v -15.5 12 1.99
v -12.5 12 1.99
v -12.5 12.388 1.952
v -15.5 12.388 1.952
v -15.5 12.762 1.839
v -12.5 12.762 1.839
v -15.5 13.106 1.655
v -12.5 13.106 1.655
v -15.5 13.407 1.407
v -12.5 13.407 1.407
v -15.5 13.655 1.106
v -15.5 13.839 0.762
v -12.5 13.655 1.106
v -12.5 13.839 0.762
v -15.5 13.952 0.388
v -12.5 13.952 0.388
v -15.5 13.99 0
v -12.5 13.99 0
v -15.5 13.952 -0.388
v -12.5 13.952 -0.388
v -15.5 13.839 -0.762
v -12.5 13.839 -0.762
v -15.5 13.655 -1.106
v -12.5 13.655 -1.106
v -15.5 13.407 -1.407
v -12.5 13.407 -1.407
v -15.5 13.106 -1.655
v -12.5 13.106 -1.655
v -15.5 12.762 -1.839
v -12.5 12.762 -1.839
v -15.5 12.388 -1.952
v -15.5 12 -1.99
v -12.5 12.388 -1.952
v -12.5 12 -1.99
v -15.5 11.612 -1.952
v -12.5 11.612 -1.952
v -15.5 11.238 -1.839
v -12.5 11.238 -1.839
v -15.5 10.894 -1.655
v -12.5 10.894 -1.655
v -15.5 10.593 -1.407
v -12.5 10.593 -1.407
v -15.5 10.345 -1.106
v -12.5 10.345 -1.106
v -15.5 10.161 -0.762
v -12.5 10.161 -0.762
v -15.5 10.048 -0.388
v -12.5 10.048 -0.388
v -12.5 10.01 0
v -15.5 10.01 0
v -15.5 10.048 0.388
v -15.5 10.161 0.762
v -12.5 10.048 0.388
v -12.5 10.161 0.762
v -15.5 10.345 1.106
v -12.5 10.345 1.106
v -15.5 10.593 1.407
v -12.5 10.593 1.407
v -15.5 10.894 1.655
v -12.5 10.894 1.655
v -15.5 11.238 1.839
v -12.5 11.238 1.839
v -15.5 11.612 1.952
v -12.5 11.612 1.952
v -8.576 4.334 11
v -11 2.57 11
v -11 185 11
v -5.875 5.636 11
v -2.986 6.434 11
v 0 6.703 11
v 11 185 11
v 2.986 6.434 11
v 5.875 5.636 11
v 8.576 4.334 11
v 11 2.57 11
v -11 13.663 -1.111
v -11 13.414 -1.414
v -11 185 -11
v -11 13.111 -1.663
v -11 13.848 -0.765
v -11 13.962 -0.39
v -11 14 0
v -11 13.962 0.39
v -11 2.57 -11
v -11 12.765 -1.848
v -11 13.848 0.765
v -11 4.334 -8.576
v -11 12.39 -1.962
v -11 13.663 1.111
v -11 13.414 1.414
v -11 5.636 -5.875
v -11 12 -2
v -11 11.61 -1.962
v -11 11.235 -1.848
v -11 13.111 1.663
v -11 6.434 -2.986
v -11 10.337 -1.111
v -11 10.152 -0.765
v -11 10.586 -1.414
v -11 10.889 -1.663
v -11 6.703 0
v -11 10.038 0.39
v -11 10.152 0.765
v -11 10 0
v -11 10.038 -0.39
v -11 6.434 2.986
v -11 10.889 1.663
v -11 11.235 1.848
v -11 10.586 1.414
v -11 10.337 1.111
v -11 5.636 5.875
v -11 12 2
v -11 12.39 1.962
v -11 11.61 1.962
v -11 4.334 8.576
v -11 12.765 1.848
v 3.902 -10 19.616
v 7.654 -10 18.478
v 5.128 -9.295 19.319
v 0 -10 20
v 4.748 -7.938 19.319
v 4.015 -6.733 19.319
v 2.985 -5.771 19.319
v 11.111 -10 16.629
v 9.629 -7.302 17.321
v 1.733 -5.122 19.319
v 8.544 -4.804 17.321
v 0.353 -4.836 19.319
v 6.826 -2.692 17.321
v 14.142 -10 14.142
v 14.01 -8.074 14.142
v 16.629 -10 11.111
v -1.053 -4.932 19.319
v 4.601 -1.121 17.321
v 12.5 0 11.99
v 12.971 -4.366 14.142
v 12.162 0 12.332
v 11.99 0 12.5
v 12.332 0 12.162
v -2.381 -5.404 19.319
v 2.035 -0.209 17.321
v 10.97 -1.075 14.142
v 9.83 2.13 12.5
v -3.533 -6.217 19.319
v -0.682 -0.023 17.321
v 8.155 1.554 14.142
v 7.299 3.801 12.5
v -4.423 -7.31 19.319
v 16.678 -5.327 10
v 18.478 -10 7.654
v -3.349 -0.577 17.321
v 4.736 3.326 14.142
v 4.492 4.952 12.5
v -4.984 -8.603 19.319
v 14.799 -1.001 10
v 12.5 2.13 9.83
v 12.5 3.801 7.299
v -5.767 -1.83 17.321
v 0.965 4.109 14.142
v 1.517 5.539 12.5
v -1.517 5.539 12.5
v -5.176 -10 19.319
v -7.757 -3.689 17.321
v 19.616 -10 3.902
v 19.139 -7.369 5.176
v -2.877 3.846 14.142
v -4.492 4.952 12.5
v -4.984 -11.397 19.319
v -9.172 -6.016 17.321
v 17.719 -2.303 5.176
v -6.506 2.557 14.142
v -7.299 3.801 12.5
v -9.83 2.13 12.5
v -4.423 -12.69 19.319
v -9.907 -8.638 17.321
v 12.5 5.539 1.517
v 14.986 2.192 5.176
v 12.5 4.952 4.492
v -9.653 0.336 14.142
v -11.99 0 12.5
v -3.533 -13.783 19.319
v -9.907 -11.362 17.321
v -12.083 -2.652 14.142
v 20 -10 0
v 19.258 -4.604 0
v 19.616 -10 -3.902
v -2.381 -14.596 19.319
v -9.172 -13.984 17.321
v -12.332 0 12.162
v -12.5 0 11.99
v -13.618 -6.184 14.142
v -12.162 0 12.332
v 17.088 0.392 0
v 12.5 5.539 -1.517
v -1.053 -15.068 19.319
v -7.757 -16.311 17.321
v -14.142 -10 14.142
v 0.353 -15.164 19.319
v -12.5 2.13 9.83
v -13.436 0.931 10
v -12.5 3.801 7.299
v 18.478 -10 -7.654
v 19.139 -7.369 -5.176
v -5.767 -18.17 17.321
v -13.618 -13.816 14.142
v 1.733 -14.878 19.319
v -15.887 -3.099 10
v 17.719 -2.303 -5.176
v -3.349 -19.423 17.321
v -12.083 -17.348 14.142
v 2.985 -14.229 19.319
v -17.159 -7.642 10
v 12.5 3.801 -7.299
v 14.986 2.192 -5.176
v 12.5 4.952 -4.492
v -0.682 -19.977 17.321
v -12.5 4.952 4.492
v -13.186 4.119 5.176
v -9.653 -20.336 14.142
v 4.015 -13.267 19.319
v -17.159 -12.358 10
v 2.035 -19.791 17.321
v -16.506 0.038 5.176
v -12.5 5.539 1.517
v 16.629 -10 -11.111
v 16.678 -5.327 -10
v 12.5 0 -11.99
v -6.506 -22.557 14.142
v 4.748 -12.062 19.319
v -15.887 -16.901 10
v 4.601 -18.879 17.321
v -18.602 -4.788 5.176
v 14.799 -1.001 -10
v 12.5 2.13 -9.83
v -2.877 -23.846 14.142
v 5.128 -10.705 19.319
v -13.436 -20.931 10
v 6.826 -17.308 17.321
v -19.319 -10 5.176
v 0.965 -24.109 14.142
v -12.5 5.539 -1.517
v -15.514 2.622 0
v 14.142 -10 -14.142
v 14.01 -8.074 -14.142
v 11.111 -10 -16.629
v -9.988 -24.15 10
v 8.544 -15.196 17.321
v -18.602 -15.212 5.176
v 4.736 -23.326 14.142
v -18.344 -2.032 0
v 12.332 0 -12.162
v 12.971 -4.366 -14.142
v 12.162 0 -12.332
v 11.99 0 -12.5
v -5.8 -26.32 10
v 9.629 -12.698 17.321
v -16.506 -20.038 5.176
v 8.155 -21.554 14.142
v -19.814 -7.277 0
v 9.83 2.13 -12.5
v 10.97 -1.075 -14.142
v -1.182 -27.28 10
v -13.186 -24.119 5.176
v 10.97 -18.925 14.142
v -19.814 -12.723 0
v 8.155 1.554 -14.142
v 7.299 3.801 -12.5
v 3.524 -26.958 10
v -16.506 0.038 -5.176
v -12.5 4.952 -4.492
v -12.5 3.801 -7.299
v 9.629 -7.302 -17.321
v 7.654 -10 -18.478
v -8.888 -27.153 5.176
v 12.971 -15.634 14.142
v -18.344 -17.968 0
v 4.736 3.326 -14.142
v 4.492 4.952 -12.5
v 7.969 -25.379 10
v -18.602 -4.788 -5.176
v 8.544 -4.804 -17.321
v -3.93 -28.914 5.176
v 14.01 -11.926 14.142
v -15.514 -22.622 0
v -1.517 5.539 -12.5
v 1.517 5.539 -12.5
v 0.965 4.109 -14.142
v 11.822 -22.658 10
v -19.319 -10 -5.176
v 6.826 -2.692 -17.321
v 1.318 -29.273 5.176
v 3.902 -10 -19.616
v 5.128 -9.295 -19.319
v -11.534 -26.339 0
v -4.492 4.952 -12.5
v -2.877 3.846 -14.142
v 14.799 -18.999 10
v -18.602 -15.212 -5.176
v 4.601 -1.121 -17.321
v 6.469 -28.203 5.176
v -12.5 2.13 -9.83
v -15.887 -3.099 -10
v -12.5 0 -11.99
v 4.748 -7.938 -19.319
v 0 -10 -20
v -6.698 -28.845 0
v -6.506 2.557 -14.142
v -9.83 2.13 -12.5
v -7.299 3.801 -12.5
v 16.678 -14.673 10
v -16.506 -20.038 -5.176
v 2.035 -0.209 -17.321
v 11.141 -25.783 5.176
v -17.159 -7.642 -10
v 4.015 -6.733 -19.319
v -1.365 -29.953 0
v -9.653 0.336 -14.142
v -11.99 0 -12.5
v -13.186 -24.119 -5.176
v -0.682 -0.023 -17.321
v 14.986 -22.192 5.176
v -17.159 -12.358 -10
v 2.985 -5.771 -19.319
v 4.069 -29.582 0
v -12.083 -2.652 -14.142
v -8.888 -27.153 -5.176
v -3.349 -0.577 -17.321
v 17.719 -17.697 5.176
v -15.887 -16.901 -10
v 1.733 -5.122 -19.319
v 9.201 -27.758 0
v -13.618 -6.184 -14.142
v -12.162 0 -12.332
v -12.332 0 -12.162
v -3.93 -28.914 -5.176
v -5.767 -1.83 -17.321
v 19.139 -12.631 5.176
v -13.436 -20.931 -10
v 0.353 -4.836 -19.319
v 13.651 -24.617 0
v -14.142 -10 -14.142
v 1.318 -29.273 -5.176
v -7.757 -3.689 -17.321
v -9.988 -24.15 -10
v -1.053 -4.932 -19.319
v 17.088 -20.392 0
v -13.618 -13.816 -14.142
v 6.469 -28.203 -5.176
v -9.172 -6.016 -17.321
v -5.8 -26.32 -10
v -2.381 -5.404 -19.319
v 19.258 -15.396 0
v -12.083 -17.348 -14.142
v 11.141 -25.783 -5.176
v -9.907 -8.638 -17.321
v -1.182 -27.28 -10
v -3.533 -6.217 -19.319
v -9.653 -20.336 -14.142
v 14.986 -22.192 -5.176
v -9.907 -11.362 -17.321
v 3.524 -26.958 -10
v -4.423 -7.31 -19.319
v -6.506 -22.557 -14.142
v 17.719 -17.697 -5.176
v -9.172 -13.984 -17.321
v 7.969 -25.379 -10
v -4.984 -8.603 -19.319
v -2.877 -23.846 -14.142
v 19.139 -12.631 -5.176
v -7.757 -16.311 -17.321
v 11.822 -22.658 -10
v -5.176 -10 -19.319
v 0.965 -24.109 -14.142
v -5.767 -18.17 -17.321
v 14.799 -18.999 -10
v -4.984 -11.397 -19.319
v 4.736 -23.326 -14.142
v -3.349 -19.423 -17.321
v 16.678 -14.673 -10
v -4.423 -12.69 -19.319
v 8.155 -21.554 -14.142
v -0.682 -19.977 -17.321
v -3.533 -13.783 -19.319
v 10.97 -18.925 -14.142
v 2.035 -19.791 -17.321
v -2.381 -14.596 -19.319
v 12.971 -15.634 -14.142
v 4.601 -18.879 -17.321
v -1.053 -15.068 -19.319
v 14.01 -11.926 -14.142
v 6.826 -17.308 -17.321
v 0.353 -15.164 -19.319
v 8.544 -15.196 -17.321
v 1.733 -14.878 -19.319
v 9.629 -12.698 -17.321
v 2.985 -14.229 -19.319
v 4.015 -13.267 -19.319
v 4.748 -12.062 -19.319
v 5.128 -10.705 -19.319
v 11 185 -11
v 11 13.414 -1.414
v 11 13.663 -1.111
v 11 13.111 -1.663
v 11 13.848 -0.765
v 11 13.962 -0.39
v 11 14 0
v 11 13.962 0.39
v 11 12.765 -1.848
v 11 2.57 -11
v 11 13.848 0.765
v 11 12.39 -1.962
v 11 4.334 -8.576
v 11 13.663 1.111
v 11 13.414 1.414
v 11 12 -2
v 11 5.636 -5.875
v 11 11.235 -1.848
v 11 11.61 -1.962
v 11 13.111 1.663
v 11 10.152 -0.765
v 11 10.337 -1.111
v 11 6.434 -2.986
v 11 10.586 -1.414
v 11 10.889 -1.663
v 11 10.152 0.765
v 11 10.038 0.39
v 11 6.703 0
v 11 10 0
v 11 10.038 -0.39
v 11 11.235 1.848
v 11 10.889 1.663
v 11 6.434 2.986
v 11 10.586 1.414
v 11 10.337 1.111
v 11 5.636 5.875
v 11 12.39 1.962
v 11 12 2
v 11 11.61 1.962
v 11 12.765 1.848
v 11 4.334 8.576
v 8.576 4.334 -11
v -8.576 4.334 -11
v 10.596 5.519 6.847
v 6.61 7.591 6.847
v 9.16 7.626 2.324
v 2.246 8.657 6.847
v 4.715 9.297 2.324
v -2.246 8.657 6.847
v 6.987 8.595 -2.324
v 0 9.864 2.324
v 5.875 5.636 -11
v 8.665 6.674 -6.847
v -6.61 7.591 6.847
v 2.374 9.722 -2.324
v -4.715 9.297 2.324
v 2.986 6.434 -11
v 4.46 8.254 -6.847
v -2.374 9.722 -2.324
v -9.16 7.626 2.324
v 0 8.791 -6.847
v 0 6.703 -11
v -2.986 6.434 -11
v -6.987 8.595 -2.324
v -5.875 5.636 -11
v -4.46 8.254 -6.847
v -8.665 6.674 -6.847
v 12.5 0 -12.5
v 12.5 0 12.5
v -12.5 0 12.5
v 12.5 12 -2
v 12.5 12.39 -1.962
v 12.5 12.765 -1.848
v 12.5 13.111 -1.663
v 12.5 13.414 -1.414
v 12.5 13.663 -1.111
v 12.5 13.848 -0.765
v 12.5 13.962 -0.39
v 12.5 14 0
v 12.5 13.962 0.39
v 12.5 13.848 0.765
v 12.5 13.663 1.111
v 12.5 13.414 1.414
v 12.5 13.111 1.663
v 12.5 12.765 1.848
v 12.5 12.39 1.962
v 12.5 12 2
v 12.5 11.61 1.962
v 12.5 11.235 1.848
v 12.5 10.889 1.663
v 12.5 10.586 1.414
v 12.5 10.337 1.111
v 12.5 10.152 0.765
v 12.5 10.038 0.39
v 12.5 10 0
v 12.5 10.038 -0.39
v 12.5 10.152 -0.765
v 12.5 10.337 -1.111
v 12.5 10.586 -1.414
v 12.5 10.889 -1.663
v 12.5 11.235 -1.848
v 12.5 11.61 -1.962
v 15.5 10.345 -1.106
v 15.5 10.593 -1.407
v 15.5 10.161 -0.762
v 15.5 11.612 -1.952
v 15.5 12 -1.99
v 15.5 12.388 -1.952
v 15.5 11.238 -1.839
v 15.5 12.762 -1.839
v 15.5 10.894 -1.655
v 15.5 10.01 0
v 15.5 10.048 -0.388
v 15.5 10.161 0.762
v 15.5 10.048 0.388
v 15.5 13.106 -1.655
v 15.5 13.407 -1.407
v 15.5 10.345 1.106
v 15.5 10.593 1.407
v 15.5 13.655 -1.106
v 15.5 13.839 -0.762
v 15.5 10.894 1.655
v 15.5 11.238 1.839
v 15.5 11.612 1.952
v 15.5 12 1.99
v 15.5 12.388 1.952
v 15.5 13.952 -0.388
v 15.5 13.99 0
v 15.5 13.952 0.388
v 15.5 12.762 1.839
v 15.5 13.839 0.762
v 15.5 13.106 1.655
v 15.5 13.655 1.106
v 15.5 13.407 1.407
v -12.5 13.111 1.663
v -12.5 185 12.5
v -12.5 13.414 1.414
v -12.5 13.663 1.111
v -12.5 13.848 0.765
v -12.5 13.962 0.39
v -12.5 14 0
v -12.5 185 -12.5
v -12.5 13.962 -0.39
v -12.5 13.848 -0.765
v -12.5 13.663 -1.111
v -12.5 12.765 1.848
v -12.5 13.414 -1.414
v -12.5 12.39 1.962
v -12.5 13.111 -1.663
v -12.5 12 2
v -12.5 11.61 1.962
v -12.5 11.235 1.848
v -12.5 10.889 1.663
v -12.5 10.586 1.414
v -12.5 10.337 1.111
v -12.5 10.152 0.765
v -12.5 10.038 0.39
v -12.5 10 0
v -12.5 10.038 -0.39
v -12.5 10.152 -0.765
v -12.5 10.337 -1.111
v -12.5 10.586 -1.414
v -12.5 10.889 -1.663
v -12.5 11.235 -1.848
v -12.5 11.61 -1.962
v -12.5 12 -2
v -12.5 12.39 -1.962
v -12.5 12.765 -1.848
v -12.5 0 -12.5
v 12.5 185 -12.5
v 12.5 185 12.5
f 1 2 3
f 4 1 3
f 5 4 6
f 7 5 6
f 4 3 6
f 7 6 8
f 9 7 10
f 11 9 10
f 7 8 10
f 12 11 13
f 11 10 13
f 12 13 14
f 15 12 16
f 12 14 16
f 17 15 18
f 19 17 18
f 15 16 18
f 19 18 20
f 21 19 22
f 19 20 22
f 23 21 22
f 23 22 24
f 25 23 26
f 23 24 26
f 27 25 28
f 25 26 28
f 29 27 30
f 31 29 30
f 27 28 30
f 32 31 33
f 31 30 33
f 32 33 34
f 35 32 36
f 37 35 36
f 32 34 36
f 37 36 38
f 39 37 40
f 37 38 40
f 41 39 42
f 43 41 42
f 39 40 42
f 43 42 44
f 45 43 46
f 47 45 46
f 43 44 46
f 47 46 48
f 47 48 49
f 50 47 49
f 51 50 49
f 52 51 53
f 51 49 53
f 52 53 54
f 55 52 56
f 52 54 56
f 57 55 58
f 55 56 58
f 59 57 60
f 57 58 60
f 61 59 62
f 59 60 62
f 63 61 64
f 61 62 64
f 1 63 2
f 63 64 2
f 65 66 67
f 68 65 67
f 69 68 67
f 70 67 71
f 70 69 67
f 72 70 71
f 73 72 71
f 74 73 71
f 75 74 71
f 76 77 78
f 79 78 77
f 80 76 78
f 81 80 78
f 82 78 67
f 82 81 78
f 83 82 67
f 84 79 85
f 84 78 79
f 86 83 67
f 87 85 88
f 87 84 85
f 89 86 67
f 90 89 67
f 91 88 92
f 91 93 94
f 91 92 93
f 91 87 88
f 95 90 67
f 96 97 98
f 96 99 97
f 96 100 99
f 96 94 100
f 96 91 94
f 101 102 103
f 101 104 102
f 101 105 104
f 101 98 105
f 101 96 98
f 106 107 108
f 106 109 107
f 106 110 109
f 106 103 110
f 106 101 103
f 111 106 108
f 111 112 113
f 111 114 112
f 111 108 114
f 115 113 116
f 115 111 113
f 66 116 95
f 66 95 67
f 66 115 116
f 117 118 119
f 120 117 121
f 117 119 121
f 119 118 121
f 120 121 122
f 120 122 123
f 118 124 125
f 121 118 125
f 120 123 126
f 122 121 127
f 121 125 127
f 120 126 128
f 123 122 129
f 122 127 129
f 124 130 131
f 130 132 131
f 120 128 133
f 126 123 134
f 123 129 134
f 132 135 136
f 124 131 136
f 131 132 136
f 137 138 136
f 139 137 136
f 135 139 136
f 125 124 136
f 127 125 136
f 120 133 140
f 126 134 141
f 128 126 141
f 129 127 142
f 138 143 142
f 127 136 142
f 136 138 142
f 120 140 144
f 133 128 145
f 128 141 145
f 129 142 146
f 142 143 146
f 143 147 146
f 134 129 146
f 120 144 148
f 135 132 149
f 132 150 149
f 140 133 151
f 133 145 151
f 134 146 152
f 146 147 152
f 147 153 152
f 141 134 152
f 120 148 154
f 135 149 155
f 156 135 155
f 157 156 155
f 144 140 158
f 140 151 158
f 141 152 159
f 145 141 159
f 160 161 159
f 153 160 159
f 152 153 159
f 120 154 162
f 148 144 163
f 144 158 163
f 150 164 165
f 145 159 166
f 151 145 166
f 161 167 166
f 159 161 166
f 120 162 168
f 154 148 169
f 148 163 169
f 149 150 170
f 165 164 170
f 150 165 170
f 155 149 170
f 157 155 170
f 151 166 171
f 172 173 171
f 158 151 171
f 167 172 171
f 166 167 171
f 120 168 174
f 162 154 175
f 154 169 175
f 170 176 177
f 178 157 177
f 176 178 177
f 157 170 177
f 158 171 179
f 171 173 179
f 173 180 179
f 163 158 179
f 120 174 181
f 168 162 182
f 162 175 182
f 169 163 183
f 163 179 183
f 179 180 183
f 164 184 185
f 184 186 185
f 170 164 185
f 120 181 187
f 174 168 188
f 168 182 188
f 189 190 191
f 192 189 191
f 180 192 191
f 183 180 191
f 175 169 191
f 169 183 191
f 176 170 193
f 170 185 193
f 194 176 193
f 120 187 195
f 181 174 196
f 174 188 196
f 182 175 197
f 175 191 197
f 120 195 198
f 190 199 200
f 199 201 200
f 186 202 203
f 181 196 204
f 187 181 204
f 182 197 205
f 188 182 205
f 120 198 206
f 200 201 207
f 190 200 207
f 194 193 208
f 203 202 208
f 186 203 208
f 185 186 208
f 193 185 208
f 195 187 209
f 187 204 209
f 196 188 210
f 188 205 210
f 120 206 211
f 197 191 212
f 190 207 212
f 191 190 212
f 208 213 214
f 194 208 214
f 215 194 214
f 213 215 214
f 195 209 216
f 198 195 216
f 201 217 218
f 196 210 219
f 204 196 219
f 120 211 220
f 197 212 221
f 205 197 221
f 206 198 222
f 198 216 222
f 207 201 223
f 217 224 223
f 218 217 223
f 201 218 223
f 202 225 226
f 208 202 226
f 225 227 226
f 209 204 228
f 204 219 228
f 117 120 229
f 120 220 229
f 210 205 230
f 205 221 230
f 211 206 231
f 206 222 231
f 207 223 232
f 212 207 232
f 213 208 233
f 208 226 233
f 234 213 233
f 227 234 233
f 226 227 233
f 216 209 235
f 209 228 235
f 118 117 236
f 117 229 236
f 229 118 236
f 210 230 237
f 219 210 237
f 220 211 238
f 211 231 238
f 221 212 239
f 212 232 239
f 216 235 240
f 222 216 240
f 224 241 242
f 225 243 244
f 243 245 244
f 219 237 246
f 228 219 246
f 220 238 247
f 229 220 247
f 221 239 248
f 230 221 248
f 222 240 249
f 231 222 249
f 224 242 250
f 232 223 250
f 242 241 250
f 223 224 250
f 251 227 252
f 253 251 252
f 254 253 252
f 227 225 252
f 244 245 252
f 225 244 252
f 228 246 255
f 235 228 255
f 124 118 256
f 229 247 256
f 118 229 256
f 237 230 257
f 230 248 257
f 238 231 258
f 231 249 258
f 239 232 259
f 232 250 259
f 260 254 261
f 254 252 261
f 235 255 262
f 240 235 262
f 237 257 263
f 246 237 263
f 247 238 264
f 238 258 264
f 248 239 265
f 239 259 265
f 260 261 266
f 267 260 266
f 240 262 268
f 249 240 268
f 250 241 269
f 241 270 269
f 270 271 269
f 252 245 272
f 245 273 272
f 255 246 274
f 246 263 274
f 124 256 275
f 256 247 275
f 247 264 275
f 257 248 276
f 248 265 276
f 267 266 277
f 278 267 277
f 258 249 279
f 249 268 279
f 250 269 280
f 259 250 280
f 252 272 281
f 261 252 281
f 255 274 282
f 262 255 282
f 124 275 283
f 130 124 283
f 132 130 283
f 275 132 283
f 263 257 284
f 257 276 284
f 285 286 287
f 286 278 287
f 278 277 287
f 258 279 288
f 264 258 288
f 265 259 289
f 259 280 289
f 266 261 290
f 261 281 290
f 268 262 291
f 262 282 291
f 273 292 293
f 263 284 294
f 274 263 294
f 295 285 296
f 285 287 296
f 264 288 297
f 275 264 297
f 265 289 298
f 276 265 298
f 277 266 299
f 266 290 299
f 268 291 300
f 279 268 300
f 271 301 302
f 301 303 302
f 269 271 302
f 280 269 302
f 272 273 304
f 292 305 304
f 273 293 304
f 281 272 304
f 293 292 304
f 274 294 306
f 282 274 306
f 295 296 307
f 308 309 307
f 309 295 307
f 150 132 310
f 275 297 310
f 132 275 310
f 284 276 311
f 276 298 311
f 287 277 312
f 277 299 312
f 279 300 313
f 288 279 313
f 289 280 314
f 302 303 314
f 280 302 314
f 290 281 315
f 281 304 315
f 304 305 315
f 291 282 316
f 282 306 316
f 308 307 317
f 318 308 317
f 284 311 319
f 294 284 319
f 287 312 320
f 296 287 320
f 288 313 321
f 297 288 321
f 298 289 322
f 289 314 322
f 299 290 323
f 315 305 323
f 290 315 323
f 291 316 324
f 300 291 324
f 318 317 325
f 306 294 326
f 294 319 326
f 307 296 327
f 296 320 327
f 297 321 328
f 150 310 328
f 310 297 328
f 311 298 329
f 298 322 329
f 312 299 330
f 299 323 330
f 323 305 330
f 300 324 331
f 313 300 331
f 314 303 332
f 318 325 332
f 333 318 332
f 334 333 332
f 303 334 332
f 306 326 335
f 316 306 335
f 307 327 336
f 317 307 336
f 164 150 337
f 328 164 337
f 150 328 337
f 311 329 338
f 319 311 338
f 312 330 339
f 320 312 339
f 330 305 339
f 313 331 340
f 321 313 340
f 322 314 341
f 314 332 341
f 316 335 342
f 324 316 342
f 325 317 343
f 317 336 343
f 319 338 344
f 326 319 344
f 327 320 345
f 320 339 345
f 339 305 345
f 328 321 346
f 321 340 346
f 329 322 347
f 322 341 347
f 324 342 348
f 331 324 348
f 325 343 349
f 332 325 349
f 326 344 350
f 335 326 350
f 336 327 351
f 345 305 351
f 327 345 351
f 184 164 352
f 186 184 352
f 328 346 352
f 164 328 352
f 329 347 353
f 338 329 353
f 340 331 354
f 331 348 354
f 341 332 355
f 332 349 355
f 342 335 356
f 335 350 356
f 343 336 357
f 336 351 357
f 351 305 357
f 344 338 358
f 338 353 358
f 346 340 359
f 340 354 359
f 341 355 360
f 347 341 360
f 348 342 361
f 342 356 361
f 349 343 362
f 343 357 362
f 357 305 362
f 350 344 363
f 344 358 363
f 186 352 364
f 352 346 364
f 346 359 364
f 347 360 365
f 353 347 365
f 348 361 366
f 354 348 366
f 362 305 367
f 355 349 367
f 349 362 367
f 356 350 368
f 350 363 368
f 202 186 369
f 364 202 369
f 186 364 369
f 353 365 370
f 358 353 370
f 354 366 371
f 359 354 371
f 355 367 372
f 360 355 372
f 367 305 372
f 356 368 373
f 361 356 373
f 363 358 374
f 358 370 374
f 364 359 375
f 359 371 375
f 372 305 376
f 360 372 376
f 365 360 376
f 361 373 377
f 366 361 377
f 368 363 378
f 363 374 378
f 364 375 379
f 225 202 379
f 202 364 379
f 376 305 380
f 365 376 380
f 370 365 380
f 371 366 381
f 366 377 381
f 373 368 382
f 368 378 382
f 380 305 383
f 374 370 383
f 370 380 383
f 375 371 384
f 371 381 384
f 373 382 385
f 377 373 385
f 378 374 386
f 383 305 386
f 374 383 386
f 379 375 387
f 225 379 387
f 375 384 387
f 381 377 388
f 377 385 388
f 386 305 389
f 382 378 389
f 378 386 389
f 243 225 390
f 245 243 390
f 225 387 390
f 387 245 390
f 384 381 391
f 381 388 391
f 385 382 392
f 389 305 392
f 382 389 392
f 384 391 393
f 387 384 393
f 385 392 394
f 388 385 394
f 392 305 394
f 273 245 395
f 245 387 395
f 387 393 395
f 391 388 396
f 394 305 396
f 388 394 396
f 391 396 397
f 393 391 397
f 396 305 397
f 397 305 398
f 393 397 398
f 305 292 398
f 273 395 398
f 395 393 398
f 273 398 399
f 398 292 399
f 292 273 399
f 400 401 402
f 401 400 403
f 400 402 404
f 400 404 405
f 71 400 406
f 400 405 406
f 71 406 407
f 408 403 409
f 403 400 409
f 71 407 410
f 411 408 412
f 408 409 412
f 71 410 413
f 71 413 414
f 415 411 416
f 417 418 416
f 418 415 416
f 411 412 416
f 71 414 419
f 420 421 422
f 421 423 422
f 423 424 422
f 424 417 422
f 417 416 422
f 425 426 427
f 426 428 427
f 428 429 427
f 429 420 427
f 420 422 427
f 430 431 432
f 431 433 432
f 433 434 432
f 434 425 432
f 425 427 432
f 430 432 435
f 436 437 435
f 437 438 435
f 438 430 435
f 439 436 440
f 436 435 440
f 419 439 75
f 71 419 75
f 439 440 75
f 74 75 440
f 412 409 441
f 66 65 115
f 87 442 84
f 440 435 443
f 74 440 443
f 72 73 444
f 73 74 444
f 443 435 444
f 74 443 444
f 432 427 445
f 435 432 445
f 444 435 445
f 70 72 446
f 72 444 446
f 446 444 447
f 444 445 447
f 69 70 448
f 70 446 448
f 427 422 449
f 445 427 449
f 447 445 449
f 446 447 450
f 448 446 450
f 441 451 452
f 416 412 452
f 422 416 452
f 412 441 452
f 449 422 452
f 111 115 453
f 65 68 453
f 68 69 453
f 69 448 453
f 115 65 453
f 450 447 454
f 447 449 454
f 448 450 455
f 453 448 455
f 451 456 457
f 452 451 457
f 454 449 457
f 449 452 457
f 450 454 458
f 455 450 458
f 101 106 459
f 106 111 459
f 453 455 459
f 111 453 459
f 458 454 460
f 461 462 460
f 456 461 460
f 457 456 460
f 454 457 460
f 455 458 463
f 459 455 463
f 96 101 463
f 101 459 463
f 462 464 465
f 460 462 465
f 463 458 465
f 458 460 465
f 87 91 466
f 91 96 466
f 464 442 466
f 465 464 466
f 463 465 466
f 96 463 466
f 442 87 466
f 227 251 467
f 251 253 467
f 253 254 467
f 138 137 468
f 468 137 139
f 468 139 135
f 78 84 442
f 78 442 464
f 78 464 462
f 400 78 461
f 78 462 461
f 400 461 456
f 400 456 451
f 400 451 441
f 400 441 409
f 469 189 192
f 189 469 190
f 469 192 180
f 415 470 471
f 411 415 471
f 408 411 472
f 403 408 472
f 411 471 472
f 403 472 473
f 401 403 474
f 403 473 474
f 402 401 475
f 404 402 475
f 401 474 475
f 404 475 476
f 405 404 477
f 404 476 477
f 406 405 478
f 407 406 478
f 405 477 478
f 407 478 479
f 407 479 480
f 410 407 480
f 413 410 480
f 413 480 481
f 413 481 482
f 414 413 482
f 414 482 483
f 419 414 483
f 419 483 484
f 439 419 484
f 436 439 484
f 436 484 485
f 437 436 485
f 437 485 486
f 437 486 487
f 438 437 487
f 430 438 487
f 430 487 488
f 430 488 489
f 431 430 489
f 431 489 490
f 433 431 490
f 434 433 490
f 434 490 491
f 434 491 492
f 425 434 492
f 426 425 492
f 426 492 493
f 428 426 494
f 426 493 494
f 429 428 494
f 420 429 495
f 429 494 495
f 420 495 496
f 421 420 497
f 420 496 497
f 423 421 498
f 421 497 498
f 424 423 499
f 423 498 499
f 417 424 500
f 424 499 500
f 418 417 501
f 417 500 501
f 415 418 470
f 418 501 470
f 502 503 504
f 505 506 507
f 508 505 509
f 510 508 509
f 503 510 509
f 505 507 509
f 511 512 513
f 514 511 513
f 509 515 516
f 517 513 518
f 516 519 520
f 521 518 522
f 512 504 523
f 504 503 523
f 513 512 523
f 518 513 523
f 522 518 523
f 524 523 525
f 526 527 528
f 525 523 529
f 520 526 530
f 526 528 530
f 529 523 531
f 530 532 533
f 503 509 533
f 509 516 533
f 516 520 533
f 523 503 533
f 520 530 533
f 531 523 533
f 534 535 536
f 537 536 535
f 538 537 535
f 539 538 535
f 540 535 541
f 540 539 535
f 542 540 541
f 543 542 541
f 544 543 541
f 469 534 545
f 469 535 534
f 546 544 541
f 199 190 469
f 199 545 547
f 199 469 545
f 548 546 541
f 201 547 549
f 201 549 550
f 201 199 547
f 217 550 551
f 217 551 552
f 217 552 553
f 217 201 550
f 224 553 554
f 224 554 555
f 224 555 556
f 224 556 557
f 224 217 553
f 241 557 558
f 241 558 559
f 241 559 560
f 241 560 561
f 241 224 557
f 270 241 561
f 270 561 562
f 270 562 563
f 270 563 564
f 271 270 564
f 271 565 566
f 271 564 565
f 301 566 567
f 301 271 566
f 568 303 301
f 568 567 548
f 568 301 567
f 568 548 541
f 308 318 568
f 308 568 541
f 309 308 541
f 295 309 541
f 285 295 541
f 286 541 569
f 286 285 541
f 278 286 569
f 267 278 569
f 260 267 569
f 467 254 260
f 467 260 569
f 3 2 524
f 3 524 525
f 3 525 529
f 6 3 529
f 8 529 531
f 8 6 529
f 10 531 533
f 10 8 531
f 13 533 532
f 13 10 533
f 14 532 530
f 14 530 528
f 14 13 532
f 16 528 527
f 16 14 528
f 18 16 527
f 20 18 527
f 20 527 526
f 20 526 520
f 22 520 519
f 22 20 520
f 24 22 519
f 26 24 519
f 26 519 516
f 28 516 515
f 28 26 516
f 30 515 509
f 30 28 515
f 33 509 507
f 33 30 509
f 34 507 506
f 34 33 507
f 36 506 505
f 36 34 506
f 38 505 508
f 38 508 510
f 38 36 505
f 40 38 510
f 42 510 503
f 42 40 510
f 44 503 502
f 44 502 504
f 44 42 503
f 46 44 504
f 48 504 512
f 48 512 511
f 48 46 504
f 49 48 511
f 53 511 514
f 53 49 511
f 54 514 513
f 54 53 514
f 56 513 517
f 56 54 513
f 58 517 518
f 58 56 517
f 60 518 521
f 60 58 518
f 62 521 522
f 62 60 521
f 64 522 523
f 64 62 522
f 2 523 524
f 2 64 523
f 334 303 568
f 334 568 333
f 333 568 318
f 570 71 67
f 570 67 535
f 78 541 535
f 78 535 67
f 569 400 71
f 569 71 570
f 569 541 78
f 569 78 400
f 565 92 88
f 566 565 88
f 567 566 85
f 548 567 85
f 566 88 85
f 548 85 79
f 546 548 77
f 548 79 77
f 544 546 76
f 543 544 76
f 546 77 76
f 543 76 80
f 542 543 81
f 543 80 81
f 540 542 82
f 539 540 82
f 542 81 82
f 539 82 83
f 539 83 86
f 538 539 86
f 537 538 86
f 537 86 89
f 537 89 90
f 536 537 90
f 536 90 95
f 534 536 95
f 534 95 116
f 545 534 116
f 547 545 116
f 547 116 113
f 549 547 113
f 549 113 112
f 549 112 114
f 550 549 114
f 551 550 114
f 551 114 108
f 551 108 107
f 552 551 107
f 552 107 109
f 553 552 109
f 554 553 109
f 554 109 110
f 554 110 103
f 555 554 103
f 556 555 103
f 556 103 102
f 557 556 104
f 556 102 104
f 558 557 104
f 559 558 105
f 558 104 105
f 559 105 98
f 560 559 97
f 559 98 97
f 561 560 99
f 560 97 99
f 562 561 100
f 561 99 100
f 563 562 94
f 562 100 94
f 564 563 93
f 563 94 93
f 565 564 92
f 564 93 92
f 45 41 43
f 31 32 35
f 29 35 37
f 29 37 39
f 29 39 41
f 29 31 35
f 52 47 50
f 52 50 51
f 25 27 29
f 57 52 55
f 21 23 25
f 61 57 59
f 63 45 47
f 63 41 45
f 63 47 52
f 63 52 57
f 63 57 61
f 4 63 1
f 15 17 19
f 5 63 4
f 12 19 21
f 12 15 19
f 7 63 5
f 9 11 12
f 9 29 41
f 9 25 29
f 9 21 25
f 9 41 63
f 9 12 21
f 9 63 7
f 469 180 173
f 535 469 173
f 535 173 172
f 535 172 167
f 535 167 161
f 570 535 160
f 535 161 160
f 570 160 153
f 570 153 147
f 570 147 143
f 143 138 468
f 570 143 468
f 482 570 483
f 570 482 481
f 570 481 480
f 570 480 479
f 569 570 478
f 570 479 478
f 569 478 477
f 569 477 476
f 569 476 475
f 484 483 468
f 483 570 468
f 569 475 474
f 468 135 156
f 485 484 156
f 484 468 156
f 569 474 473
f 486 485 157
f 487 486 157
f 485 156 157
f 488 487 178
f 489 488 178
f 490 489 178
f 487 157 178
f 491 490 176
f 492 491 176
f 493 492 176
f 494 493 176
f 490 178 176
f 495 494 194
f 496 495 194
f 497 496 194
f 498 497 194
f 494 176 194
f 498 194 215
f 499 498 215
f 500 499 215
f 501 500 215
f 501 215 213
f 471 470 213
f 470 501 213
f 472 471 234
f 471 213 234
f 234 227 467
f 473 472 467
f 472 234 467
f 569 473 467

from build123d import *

# Parameters (mm, degrees)
SKETCH1_W           = 25
SKETCH1_H           = 25
BOSS_EXTRUDE1_DEPTH = 185
SKETCH3_W           = 22
SKETCH3_H           = 22
CUT_EXTRUDE1_DEPTH  = 300
SKETCH6_R           = 2
CUT_EXTRUDE3_DEPTH  = 25
SKETCH9_R           = 1.99
BOSS_EXTRUDE8_DEPTH = 28
SKETCH10_R          = 1.99
BOSS_EXTRUDE9_DEPTH = 3


with BuildPart() as part:
    # Sketch1 → Boss-Extrude1 (new body)
    with BuildSketch(Plane(origin=(0, 0, 0), x_dir=(1, 0, 0), z_dir=(0, 1, 0))):
        Rectangle(SKETCH1_W, SKETCH1_H)
    extrude(amount=BOSS_EXTRUDE1_DEPTH)

    # Sketch3 → Cut-Extrude1 (cut)
    with BuildSketch(Plane.XZ):
        Rectangle(SKETCH3_W, SKETCH3_H)
    extrude(amount=-CUT_EXTRUDE1_DEPTH, mode=Mode.SUBTRACT)

    # Sketch4 → Revolve1 (revolve)
    with BuildSketch(Plane(origin=(0, -10, 0), x_dir=(-1, 0, 0), z_dir=(0, -1, 0))):
        with BuildLine():
            Line((0, 20), (0, -20))
            ThreePointArc((0, -20), (-20, 0), (0, 20))
        make_face()
    revolve(axis=Axis((0, -10, -13.212098256), (0, 0, 1)))

    # Sketch6 → Cut-Extrude3 (cut)
    with BuildSketch(Plane(origin=(12.5, 0, 0), x_dir=(0, 0, -1), z_dir=(1, 0, 0))):
        with Locations((0, 12)):
            Circle(SKETCH6_R)
    extrude(amount=-CUT_EXTRUDE3_DEPTH, mode=Mode.SUBTRACT)


with BuildPart() as body_2:
    # Sketch9 → Boss-Extrude8 (new body)
    with BuildSketch(Plane.ZY.offset(12.5)):
        with Locations((0, 12)):
            Circle(SKETCH9_R)
    extrude(amount=-BOSS_EXTRUDE8_DEPTH)

    # Sketch10 → Boss-Extrude9 (add)
    with BuildSketch(Plane.ZY.offset(12.5)):
        with Locations((0, 12)):
            Circle(SKETCH10_R)
    extrude(amount=BOSS_EXTRUDE9_DEPTH)


solid = Compound([part.part, body_2.part])
